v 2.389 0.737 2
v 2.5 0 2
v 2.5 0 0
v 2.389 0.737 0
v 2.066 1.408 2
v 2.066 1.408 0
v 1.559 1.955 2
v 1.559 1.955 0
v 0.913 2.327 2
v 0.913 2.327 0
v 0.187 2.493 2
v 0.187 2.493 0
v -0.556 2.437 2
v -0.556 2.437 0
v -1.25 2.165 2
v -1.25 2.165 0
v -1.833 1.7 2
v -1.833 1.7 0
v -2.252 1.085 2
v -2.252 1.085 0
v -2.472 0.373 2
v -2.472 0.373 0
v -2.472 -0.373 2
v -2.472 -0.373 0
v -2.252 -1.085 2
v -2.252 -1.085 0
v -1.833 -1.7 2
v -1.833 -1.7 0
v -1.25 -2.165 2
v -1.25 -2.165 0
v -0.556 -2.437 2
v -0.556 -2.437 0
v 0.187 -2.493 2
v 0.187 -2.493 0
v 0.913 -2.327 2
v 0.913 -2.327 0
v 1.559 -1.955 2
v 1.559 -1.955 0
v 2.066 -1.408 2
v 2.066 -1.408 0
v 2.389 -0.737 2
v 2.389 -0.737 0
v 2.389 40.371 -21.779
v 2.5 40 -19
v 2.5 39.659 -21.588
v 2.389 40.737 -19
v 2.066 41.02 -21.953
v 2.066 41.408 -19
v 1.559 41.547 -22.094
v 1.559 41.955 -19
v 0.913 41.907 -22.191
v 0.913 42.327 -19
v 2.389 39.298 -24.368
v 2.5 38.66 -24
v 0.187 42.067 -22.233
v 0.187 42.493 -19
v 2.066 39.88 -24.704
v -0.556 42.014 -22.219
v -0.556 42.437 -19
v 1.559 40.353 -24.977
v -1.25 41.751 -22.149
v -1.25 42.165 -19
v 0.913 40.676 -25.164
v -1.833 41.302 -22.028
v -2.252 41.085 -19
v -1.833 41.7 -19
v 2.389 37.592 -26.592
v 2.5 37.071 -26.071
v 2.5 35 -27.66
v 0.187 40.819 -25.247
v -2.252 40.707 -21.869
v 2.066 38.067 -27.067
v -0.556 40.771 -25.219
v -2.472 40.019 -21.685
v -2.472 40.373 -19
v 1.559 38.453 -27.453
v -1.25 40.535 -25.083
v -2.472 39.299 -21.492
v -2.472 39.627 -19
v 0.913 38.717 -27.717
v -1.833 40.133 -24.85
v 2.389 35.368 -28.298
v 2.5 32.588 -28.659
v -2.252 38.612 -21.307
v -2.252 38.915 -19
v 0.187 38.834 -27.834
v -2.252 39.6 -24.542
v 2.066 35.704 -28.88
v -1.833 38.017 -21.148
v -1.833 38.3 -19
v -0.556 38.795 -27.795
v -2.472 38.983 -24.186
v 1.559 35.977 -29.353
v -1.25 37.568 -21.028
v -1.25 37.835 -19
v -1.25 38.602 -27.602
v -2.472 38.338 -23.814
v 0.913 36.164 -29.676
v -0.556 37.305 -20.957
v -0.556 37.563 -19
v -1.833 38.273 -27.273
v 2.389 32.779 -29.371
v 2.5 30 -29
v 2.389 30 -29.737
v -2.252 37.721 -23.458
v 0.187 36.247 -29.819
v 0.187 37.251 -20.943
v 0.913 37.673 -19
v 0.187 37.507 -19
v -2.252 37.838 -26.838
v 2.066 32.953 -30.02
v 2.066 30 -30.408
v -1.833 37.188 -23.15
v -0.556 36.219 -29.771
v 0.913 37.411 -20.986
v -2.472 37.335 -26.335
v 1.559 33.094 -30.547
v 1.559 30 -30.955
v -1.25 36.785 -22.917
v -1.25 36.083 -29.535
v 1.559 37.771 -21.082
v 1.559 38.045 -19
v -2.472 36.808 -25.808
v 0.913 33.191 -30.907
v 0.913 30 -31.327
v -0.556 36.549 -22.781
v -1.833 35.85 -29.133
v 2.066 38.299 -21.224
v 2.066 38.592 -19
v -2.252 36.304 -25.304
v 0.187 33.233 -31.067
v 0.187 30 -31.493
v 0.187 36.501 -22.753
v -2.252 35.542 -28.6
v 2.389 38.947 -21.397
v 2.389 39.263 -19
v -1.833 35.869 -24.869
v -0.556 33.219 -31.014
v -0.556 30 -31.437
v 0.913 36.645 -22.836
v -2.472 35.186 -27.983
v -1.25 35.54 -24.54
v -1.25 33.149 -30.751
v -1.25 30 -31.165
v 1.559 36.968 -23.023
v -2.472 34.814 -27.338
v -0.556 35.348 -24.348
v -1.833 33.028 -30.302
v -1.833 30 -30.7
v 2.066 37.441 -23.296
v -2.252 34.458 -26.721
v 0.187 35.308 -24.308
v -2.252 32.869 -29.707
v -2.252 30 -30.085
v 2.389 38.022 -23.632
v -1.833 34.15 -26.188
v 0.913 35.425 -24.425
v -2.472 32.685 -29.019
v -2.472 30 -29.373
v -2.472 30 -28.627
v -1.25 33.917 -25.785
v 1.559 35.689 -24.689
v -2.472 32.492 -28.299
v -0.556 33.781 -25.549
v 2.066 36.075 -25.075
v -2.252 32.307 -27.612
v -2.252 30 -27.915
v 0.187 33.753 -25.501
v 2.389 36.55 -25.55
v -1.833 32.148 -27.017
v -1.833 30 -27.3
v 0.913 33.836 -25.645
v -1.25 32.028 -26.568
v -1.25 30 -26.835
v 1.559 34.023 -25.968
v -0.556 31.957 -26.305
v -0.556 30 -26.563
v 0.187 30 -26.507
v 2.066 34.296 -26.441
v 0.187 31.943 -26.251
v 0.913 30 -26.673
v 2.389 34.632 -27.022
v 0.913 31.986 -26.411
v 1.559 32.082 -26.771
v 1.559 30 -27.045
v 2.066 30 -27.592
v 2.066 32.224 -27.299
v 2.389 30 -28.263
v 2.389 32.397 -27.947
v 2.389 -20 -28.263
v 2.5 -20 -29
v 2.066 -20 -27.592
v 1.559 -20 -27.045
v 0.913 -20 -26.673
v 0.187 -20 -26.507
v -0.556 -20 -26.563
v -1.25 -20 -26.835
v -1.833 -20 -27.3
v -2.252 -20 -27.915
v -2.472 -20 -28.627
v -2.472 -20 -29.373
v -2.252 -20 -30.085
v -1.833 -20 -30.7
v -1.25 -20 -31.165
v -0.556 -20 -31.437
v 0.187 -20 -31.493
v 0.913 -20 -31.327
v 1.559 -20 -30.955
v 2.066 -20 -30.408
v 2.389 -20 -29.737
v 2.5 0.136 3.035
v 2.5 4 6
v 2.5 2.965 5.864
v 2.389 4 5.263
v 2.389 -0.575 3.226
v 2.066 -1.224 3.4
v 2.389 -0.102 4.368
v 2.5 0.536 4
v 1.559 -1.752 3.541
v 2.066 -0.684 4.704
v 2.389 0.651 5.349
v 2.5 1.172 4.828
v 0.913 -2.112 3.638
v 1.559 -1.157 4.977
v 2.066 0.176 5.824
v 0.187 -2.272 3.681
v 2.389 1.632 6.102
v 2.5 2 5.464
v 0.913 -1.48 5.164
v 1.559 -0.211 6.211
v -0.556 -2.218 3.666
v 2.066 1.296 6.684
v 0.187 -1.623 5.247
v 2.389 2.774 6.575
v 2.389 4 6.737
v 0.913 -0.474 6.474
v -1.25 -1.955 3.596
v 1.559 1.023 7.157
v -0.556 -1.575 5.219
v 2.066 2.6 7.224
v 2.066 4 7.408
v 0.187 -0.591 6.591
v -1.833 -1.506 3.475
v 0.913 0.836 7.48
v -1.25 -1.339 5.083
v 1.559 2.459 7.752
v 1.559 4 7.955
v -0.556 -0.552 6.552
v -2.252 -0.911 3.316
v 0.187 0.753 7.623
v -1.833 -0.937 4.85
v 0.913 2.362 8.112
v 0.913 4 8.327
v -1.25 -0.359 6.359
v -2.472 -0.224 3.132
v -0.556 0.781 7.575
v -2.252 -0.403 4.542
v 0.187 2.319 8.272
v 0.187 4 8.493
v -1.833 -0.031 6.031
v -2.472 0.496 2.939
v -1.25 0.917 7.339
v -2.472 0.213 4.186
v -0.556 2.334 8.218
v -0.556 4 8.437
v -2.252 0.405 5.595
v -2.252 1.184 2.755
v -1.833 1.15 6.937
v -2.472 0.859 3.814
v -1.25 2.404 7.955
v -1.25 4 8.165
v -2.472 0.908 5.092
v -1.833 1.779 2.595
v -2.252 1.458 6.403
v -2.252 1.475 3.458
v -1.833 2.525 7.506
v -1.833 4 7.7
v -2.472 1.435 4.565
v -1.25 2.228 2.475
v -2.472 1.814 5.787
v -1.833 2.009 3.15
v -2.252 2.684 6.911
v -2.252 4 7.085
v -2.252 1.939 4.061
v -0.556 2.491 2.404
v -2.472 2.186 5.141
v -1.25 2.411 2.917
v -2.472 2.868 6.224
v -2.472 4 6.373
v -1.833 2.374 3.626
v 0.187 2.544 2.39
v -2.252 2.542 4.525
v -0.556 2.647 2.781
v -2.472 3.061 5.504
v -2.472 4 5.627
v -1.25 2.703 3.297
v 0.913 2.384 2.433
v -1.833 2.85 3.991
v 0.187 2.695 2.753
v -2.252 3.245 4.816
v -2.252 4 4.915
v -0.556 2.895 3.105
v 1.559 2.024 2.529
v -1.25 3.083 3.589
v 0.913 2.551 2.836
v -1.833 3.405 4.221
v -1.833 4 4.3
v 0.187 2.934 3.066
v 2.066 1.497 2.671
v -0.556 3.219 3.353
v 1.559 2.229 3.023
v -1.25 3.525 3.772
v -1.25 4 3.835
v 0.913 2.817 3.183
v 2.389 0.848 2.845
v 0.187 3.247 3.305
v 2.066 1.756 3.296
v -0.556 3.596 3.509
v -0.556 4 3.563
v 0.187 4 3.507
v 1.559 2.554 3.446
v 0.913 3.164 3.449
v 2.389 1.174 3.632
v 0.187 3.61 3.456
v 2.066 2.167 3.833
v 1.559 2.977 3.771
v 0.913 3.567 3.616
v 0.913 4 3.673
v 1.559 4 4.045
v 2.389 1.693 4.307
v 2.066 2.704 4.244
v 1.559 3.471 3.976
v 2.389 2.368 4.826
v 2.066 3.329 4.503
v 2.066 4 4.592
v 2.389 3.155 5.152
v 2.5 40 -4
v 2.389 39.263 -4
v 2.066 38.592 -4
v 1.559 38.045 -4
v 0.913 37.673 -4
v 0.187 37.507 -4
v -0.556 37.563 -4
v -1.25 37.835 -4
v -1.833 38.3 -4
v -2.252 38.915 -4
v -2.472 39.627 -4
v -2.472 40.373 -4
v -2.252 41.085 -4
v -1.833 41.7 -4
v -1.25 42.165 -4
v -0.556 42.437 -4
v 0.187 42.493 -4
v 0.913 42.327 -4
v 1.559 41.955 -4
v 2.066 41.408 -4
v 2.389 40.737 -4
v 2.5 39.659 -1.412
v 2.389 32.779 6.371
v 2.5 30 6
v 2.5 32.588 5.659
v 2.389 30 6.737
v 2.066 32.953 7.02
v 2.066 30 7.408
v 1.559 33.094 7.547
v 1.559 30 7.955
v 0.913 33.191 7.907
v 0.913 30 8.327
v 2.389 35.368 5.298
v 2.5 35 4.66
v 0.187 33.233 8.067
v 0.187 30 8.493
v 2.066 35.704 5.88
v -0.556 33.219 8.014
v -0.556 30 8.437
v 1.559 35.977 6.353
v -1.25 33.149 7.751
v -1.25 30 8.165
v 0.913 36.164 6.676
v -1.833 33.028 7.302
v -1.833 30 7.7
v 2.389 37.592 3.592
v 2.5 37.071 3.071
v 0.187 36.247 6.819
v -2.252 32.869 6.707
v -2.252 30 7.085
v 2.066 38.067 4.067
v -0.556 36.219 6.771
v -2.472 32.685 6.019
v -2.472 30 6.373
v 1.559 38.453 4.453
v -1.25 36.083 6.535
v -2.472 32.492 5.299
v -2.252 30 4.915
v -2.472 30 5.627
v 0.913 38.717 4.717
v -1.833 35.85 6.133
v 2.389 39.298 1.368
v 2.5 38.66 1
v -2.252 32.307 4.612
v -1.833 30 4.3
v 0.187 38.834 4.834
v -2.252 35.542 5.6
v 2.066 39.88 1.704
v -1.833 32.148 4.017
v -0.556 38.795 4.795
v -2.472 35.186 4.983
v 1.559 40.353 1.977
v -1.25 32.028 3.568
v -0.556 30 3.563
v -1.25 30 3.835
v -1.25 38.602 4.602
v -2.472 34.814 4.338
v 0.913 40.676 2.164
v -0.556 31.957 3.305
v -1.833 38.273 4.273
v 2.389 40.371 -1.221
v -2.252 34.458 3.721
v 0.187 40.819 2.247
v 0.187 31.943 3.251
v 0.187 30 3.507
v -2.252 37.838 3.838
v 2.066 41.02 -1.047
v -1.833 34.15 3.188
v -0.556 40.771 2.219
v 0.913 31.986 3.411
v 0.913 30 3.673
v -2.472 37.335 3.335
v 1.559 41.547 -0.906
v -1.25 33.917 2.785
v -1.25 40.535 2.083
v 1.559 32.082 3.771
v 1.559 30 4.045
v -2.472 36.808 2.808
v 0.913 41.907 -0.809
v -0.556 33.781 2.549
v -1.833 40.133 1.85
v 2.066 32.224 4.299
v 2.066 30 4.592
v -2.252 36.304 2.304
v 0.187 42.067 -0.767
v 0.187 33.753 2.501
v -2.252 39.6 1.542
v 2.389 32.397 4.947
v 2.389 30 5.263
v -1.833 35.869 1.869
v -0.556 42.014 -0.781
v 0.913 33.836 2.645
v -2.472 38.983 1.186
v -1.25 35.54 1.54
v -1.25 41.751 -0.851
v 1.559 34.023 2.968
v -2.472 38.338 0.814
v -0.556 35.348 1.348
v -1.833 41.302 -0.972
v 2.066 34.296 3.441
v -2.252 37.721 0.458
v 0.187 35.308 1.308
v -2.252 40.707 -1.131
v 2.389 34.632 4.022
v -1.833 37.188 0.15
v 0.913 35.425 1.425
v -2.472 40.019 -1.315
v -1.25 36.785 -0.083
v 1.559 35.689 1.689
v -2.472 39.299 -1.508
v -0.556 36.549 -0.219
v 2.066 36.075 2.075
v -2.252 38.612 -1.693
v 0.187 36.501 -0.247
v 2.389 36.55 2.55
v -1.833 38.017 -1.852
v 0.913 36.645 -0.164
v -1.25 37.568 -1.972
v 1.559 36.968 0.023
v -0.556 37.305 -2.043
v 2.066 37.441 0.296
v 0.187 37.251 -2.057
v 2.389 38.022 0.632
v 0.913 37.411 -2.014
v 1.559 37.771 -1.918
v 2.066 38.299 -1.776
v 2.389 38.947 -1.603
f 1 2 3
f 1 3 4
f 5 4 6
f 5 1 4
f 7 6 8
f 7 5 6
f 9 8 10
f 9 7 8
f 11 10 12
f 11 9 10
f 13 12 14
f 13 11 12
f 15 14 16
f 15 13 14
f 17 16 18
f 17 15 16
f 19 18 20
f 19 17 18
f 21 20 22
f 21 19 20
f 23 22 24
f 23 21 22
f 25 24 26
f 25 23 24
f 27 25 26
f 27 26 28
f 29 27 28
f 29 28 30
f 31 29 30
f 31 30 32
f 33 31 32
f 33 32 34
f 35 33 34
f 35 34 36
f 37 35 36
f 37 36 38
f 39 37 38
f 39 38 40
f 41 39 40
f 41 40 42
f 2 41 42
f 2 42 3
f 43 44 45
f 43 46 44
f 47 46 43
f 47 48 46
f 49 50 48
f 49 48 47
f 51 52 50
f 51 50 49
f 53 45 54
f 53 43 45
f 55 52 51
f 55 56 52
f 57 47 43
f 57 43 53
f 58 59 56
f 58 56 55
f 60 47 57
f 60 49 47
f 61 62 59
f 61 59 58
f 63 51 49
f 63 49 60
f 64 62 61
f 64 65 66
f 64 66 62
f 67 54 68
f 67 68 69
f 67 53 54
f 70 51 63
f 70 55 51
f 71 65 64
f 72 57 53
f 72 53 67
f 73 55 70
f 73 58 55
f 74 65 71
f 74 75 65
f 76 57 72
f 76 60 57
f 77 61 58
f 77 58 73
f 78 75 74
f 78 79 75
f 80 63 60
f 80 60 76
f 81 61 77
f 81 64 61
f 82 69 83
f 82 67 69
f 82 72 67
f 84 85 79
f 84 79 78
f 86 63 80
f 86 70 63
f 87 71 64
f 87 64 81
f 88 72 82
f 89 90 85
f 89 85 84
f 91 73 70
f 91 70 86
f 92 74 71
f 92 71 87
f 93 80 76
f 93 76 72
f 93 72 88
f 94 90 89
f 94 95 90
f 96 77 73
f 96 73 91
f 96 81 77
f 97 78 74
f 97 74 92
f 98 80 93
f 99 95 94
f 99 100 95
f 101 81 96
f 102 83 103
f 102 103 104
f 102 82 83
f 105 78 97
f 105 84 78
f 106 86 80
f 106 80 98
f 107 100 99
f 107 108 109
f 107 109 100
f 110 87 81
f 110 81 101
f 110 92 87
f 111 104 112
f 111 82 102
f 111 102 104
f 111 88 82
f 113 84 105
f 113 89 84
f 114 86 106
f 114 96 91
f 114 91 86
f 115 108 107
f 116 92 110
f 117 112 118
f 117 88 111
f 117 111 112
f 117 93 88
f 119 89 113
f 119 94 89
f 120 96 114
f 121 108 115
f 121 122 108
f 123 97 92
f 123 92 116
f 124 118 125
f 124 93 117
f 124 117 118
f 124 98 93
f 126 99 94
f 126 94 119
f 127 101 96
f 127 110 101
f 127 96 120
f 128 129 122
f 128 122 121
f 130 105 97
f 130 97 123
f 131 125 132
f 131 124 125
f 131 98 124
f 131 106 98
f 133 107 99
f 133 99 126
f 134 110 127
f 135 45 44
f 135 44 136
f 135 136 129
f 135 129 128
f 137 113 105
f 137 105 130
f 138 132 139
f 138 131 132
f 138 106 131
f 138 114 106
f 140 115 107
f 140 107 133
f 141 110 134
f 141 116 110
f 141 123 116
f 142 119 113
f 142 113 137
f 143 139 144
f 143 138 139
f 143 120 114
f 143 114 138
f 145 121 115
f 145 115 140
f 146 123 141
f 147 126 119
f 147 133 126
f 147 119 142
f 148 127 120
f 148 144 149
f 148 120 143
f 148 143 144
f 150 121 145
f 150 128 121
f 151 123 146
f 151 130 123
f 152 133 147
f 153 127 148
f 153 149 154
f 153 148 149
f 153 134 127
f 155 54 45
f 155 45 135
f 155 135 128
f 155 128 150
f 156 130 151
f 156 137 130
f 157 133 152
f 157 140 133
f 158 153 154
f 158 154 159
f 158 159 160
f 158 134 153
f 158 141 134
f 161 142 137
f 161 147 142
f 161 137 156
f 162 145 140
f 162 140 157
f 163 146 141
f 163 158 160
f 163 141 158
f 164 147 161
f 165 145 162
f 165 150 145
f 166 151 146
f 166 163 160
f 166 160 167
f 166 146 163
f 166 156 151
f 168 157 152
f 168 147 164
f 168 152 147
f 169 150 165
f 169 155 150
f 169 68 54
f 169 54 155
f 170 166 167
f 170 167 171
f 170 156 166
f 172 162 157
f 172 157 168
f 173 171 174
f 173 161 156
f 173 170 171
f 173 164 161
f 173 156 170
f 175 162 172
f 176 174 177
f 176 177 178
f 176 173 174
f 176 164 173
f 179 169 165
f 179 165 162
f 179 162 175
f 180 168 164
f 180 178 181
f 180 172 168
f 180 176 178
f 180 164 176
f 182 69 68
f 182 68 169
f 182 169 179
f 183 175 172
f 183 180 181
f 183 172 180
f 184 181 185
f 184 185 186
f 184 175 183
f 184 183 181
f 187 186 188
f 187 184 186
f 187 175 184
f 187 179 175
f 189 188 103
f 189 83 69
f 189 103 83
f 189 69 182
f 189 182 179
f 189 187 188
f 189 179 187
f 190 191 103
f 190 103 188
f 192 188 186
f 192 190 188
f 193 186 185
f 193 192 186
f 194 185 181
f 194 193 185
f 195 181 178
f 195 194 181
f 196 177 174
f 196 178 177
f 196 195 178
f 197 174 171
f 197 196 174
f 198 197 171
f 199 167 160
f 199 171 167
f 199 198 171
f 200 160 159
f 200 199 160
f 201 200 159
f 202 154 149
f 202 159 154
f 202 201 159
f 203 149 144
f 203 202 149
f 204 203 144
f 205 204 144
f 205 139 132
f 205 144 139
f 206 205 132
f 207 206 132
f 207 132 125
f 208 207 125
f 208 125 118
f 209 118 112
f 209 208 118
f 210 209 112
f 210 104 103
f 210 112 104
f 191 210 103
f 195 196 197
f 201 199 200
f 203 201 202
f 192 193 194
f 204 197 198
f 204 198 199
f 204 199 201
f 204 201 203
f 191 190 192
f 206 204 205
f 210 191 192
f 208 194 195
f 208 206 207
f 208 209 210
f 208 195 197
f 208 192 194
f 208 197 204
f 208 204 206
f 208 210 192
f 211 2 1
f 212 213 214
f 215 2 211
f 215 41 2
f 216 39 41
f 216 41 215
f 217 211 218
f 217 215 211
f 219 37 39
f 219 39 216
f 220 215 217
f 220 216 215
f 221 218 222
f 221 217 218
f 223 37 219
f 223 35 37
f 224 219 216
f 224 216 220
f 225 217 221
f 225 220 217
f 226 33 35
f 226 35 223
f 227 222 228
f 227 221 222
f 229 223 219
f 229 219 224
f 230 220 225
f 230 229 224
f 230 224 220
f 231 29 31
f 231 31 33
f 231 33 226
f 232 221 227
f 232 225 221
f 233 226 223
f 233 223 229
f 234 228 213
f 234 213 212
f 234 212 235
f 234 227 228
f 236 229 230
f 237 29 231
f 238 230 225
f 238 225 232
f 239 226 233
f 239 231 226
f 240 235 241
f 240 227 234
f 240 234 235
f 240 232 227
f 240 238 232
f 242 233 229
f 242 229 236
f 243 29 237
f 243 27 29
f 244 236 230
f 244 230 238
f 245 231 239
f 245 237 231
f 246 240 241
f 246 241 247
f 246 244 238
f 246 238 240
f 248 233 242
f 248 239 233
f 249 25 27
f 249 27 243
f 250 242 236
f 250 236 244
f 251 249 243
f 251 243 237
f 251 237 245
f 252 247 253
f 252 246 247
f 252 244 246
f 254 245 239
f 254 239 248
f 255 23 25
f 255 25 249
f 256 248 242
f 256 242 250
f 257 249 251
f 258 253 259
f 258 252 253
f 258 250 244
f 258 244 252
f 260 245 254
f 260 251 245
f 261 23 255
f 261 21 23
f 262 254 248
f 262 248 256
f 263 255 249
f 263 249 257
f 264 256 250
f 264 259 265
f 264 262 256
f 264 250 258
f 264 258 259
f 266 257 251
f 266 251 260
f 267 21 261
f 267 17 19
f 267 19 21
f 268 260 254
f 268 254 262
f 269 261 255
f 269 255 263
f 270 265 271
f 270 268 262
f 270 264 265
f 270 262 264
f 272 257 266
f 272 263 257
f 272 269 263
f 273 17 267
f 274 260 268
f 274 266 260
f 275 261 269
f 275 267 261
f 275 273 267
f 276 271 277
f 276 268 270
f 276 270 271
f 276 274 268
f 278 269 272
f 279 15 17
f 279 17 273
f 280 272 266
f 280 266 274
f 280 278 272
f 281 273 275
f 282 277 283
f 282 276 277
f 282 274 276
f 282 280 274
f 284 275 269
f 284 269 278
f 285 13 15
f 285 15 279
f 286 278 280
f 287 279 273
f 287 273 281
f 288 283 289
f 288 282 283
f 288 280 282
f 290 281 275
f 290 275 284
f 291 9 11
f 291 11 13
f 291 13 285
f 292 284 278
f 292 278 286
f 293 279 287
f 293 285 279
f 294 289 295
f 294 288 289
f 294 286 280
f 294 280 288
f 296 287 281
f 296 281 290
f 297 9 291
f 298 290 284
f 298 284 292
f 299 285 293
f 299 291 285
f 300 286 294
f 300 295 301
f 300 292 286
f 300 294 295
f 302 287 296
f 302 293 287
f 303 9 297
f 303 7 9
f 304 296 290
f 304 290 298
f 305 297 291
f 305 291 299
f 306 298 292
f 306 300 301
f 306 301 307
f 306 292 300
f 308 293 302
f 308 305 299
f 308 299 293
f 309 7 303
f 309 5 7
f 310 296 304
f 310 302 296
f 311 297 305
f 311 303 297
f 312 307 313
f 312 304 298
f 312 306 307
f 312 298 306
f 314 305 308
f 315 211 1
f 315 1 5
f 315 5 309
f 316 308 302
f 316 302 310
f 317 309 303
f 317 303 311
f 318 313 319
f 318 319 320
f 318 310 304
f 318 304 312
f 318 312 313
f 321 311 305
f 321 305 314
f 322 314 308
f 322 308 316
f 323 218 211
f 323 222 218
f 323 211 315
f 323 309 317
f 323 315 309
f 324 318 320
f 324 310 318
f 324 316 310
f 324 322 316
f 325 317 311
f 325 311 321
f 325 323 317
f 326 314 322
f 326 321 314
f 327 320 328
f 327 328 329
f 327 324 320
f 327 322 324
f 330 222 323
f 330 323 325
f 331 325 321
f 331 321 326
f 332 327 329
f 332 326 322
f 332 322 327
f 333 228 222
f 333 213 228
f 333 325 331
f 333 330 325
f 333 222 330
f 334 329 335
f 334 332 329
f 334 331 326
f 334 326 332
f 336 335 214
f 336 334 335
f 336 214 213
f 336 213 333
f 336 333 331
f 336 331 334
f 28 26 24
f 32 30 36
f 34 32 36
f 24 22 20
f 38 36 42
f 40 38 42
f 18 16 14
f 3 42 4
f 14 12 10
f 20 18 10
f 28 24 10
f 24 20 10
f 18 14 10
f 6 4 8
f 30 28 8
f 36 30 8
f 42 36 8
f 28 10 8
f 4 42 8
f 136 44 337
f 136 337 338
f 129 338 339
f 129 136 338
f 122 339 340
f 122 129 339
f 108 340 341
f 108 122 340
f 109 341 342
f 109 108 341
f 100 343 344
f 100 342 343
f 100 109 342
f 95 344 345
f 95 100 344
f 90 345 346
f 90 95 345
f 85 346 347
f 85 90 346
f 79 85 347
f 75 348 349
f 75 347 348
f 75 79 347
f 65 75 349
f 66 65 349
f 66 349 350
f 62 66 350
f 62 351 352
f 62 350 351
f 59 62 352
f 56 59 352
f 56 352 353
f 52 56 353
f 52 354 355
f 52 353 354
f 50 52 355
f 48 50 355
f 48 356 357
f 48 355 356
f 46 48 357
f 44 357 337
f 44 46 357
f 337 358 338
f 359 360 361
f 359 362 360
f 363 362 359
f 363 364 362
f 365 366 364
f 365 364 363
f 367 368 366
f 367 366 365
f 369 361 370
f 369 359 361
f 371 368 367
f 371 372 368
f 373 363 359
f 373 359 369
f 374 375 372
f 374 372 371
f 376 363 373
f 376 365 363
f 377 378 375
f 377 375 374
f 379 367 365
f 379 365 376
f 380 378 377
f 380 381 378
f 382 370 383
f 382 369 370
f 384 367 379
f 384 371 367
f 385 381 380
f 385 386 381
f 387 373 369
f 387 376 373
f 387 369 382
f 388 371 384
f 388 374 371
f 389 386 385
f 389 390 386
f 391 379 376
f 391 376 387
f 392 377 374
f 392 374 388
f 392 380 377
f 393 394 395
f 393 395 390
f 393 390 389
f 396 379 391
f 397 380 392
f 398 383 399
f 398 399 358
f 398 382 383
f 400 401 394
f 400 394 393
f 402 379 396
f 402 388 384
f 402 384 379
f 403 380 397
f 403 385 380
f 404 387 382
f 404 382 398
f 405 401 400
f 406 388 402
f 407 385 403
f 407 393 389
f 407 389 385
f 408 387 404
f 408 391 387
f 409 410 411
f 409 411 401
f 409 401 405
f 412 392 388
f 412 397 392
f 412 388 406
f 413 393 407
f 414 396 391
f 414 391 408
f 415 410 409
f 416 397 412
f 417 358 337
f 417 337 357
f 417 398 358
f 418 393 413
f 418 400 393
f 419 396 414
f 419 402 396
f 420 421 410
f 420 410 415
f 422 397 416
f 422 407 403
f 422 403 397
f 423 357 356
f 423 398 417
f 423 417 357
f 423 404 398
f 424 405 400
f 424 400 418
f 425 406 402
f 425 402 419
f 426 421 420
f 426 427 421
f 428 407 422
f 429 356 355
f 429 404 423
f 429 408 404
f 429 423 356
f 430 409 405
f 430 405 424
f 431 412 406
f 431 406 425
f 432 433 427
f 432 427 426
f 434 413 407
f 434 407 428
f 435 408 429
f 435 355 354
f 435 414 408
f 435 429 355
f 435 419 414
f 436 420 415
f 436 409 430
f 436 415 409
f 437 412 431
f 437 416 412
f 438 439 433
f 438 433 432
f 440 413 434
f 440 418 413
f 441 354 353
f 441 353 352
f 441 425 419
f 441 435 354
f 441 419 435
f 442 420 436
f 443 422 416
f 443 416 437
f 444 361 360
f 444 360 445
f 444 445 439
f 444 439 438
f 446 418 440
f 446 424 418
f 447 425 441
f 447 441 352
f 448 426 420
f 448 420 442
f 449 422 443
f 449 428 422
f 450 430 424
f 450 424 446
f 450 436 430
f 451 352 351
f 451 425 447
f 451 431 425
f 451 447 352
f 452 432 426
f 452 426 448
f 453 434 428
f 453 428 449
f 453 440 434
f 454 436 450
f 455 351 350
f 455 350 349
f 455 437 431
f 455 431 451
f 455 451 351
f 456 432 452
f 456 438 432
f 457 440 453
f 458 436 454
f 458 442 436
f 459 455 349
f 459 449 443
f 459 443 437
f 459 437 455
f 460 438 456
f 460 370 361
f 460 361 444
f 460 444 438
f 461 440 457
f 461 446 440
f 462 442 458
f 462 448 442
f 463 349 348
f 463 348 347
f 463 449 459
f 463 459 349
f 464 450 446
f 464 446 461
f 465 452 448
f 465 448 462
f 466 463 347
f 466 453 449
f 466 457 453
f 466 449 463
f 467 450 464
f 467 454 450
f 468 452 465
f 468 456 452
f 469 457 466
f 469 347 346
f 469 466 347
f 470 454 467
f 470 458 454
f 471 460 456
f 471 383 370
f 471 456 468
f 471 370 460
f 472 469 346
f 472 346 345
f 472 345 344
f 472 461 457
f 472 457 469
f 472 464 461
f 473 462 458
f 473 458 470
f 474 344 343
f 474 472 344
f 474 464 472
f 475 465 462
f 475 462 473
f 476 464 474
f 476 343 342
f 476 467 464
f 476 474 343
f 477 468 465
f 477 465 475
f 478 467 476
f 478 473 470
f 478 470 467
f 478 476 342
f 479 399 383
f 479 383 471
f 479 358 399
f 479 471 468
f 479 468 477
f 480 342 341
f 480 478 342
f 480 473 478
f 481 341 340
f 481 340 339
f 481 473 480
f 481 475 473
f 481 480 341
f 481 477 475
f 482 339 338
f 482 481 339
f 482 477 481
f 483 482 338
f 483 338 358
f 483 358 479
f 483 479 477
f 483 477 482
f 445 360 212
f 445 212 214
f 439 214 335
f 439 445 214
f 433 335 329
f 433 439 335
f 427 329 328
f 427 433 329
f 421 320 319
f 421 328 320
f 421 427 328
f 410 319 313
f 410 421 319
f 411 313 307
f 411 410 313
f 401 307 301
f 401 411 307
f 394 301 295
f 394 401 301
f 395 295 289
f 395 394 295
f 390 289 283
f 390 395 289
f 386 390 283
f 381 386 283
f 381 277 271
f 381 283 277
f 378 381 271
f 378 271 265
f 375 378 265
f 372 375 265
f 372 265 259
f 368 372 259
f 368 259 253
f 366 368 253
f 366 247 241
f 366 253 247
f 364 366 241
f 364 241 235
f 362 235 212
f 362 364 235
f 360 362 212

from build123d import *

# Parameters (mm, degrees)
SKETCH2_R = 2.5


with BuildPart() as part:
    # Sweep1: sweep along a path in Sketch1
    with BuildLine(Plane(origin=(0, 0, 0), x_dir=(0, 0, -1), z_dir=(1, 0, 0))) as sweep1_path:
        Line((0, 0), (-2, 0))
        ThreePointArc((-2, 0), (-4.828427125, 1.171572875), (-6, 4))
        Line((-6, 4), (-6, 30))
        ThreePointArc((-6, 30), (-3.071067812, 37.071067812), (4, 40))
        Line((4, 40), (19, 40))
        ThreePointArc((19, 40), (26.071067812, 37.071067812), (29, 30))
        Line((29, 30), (29, -20))
    # Sketch2 → Sweep1 (sweep)
    with BuildSketch(Plane.XY):
        Circle(SKETCH2_R)
    sweep(path=sweep1_path.line)


solid = part.part
